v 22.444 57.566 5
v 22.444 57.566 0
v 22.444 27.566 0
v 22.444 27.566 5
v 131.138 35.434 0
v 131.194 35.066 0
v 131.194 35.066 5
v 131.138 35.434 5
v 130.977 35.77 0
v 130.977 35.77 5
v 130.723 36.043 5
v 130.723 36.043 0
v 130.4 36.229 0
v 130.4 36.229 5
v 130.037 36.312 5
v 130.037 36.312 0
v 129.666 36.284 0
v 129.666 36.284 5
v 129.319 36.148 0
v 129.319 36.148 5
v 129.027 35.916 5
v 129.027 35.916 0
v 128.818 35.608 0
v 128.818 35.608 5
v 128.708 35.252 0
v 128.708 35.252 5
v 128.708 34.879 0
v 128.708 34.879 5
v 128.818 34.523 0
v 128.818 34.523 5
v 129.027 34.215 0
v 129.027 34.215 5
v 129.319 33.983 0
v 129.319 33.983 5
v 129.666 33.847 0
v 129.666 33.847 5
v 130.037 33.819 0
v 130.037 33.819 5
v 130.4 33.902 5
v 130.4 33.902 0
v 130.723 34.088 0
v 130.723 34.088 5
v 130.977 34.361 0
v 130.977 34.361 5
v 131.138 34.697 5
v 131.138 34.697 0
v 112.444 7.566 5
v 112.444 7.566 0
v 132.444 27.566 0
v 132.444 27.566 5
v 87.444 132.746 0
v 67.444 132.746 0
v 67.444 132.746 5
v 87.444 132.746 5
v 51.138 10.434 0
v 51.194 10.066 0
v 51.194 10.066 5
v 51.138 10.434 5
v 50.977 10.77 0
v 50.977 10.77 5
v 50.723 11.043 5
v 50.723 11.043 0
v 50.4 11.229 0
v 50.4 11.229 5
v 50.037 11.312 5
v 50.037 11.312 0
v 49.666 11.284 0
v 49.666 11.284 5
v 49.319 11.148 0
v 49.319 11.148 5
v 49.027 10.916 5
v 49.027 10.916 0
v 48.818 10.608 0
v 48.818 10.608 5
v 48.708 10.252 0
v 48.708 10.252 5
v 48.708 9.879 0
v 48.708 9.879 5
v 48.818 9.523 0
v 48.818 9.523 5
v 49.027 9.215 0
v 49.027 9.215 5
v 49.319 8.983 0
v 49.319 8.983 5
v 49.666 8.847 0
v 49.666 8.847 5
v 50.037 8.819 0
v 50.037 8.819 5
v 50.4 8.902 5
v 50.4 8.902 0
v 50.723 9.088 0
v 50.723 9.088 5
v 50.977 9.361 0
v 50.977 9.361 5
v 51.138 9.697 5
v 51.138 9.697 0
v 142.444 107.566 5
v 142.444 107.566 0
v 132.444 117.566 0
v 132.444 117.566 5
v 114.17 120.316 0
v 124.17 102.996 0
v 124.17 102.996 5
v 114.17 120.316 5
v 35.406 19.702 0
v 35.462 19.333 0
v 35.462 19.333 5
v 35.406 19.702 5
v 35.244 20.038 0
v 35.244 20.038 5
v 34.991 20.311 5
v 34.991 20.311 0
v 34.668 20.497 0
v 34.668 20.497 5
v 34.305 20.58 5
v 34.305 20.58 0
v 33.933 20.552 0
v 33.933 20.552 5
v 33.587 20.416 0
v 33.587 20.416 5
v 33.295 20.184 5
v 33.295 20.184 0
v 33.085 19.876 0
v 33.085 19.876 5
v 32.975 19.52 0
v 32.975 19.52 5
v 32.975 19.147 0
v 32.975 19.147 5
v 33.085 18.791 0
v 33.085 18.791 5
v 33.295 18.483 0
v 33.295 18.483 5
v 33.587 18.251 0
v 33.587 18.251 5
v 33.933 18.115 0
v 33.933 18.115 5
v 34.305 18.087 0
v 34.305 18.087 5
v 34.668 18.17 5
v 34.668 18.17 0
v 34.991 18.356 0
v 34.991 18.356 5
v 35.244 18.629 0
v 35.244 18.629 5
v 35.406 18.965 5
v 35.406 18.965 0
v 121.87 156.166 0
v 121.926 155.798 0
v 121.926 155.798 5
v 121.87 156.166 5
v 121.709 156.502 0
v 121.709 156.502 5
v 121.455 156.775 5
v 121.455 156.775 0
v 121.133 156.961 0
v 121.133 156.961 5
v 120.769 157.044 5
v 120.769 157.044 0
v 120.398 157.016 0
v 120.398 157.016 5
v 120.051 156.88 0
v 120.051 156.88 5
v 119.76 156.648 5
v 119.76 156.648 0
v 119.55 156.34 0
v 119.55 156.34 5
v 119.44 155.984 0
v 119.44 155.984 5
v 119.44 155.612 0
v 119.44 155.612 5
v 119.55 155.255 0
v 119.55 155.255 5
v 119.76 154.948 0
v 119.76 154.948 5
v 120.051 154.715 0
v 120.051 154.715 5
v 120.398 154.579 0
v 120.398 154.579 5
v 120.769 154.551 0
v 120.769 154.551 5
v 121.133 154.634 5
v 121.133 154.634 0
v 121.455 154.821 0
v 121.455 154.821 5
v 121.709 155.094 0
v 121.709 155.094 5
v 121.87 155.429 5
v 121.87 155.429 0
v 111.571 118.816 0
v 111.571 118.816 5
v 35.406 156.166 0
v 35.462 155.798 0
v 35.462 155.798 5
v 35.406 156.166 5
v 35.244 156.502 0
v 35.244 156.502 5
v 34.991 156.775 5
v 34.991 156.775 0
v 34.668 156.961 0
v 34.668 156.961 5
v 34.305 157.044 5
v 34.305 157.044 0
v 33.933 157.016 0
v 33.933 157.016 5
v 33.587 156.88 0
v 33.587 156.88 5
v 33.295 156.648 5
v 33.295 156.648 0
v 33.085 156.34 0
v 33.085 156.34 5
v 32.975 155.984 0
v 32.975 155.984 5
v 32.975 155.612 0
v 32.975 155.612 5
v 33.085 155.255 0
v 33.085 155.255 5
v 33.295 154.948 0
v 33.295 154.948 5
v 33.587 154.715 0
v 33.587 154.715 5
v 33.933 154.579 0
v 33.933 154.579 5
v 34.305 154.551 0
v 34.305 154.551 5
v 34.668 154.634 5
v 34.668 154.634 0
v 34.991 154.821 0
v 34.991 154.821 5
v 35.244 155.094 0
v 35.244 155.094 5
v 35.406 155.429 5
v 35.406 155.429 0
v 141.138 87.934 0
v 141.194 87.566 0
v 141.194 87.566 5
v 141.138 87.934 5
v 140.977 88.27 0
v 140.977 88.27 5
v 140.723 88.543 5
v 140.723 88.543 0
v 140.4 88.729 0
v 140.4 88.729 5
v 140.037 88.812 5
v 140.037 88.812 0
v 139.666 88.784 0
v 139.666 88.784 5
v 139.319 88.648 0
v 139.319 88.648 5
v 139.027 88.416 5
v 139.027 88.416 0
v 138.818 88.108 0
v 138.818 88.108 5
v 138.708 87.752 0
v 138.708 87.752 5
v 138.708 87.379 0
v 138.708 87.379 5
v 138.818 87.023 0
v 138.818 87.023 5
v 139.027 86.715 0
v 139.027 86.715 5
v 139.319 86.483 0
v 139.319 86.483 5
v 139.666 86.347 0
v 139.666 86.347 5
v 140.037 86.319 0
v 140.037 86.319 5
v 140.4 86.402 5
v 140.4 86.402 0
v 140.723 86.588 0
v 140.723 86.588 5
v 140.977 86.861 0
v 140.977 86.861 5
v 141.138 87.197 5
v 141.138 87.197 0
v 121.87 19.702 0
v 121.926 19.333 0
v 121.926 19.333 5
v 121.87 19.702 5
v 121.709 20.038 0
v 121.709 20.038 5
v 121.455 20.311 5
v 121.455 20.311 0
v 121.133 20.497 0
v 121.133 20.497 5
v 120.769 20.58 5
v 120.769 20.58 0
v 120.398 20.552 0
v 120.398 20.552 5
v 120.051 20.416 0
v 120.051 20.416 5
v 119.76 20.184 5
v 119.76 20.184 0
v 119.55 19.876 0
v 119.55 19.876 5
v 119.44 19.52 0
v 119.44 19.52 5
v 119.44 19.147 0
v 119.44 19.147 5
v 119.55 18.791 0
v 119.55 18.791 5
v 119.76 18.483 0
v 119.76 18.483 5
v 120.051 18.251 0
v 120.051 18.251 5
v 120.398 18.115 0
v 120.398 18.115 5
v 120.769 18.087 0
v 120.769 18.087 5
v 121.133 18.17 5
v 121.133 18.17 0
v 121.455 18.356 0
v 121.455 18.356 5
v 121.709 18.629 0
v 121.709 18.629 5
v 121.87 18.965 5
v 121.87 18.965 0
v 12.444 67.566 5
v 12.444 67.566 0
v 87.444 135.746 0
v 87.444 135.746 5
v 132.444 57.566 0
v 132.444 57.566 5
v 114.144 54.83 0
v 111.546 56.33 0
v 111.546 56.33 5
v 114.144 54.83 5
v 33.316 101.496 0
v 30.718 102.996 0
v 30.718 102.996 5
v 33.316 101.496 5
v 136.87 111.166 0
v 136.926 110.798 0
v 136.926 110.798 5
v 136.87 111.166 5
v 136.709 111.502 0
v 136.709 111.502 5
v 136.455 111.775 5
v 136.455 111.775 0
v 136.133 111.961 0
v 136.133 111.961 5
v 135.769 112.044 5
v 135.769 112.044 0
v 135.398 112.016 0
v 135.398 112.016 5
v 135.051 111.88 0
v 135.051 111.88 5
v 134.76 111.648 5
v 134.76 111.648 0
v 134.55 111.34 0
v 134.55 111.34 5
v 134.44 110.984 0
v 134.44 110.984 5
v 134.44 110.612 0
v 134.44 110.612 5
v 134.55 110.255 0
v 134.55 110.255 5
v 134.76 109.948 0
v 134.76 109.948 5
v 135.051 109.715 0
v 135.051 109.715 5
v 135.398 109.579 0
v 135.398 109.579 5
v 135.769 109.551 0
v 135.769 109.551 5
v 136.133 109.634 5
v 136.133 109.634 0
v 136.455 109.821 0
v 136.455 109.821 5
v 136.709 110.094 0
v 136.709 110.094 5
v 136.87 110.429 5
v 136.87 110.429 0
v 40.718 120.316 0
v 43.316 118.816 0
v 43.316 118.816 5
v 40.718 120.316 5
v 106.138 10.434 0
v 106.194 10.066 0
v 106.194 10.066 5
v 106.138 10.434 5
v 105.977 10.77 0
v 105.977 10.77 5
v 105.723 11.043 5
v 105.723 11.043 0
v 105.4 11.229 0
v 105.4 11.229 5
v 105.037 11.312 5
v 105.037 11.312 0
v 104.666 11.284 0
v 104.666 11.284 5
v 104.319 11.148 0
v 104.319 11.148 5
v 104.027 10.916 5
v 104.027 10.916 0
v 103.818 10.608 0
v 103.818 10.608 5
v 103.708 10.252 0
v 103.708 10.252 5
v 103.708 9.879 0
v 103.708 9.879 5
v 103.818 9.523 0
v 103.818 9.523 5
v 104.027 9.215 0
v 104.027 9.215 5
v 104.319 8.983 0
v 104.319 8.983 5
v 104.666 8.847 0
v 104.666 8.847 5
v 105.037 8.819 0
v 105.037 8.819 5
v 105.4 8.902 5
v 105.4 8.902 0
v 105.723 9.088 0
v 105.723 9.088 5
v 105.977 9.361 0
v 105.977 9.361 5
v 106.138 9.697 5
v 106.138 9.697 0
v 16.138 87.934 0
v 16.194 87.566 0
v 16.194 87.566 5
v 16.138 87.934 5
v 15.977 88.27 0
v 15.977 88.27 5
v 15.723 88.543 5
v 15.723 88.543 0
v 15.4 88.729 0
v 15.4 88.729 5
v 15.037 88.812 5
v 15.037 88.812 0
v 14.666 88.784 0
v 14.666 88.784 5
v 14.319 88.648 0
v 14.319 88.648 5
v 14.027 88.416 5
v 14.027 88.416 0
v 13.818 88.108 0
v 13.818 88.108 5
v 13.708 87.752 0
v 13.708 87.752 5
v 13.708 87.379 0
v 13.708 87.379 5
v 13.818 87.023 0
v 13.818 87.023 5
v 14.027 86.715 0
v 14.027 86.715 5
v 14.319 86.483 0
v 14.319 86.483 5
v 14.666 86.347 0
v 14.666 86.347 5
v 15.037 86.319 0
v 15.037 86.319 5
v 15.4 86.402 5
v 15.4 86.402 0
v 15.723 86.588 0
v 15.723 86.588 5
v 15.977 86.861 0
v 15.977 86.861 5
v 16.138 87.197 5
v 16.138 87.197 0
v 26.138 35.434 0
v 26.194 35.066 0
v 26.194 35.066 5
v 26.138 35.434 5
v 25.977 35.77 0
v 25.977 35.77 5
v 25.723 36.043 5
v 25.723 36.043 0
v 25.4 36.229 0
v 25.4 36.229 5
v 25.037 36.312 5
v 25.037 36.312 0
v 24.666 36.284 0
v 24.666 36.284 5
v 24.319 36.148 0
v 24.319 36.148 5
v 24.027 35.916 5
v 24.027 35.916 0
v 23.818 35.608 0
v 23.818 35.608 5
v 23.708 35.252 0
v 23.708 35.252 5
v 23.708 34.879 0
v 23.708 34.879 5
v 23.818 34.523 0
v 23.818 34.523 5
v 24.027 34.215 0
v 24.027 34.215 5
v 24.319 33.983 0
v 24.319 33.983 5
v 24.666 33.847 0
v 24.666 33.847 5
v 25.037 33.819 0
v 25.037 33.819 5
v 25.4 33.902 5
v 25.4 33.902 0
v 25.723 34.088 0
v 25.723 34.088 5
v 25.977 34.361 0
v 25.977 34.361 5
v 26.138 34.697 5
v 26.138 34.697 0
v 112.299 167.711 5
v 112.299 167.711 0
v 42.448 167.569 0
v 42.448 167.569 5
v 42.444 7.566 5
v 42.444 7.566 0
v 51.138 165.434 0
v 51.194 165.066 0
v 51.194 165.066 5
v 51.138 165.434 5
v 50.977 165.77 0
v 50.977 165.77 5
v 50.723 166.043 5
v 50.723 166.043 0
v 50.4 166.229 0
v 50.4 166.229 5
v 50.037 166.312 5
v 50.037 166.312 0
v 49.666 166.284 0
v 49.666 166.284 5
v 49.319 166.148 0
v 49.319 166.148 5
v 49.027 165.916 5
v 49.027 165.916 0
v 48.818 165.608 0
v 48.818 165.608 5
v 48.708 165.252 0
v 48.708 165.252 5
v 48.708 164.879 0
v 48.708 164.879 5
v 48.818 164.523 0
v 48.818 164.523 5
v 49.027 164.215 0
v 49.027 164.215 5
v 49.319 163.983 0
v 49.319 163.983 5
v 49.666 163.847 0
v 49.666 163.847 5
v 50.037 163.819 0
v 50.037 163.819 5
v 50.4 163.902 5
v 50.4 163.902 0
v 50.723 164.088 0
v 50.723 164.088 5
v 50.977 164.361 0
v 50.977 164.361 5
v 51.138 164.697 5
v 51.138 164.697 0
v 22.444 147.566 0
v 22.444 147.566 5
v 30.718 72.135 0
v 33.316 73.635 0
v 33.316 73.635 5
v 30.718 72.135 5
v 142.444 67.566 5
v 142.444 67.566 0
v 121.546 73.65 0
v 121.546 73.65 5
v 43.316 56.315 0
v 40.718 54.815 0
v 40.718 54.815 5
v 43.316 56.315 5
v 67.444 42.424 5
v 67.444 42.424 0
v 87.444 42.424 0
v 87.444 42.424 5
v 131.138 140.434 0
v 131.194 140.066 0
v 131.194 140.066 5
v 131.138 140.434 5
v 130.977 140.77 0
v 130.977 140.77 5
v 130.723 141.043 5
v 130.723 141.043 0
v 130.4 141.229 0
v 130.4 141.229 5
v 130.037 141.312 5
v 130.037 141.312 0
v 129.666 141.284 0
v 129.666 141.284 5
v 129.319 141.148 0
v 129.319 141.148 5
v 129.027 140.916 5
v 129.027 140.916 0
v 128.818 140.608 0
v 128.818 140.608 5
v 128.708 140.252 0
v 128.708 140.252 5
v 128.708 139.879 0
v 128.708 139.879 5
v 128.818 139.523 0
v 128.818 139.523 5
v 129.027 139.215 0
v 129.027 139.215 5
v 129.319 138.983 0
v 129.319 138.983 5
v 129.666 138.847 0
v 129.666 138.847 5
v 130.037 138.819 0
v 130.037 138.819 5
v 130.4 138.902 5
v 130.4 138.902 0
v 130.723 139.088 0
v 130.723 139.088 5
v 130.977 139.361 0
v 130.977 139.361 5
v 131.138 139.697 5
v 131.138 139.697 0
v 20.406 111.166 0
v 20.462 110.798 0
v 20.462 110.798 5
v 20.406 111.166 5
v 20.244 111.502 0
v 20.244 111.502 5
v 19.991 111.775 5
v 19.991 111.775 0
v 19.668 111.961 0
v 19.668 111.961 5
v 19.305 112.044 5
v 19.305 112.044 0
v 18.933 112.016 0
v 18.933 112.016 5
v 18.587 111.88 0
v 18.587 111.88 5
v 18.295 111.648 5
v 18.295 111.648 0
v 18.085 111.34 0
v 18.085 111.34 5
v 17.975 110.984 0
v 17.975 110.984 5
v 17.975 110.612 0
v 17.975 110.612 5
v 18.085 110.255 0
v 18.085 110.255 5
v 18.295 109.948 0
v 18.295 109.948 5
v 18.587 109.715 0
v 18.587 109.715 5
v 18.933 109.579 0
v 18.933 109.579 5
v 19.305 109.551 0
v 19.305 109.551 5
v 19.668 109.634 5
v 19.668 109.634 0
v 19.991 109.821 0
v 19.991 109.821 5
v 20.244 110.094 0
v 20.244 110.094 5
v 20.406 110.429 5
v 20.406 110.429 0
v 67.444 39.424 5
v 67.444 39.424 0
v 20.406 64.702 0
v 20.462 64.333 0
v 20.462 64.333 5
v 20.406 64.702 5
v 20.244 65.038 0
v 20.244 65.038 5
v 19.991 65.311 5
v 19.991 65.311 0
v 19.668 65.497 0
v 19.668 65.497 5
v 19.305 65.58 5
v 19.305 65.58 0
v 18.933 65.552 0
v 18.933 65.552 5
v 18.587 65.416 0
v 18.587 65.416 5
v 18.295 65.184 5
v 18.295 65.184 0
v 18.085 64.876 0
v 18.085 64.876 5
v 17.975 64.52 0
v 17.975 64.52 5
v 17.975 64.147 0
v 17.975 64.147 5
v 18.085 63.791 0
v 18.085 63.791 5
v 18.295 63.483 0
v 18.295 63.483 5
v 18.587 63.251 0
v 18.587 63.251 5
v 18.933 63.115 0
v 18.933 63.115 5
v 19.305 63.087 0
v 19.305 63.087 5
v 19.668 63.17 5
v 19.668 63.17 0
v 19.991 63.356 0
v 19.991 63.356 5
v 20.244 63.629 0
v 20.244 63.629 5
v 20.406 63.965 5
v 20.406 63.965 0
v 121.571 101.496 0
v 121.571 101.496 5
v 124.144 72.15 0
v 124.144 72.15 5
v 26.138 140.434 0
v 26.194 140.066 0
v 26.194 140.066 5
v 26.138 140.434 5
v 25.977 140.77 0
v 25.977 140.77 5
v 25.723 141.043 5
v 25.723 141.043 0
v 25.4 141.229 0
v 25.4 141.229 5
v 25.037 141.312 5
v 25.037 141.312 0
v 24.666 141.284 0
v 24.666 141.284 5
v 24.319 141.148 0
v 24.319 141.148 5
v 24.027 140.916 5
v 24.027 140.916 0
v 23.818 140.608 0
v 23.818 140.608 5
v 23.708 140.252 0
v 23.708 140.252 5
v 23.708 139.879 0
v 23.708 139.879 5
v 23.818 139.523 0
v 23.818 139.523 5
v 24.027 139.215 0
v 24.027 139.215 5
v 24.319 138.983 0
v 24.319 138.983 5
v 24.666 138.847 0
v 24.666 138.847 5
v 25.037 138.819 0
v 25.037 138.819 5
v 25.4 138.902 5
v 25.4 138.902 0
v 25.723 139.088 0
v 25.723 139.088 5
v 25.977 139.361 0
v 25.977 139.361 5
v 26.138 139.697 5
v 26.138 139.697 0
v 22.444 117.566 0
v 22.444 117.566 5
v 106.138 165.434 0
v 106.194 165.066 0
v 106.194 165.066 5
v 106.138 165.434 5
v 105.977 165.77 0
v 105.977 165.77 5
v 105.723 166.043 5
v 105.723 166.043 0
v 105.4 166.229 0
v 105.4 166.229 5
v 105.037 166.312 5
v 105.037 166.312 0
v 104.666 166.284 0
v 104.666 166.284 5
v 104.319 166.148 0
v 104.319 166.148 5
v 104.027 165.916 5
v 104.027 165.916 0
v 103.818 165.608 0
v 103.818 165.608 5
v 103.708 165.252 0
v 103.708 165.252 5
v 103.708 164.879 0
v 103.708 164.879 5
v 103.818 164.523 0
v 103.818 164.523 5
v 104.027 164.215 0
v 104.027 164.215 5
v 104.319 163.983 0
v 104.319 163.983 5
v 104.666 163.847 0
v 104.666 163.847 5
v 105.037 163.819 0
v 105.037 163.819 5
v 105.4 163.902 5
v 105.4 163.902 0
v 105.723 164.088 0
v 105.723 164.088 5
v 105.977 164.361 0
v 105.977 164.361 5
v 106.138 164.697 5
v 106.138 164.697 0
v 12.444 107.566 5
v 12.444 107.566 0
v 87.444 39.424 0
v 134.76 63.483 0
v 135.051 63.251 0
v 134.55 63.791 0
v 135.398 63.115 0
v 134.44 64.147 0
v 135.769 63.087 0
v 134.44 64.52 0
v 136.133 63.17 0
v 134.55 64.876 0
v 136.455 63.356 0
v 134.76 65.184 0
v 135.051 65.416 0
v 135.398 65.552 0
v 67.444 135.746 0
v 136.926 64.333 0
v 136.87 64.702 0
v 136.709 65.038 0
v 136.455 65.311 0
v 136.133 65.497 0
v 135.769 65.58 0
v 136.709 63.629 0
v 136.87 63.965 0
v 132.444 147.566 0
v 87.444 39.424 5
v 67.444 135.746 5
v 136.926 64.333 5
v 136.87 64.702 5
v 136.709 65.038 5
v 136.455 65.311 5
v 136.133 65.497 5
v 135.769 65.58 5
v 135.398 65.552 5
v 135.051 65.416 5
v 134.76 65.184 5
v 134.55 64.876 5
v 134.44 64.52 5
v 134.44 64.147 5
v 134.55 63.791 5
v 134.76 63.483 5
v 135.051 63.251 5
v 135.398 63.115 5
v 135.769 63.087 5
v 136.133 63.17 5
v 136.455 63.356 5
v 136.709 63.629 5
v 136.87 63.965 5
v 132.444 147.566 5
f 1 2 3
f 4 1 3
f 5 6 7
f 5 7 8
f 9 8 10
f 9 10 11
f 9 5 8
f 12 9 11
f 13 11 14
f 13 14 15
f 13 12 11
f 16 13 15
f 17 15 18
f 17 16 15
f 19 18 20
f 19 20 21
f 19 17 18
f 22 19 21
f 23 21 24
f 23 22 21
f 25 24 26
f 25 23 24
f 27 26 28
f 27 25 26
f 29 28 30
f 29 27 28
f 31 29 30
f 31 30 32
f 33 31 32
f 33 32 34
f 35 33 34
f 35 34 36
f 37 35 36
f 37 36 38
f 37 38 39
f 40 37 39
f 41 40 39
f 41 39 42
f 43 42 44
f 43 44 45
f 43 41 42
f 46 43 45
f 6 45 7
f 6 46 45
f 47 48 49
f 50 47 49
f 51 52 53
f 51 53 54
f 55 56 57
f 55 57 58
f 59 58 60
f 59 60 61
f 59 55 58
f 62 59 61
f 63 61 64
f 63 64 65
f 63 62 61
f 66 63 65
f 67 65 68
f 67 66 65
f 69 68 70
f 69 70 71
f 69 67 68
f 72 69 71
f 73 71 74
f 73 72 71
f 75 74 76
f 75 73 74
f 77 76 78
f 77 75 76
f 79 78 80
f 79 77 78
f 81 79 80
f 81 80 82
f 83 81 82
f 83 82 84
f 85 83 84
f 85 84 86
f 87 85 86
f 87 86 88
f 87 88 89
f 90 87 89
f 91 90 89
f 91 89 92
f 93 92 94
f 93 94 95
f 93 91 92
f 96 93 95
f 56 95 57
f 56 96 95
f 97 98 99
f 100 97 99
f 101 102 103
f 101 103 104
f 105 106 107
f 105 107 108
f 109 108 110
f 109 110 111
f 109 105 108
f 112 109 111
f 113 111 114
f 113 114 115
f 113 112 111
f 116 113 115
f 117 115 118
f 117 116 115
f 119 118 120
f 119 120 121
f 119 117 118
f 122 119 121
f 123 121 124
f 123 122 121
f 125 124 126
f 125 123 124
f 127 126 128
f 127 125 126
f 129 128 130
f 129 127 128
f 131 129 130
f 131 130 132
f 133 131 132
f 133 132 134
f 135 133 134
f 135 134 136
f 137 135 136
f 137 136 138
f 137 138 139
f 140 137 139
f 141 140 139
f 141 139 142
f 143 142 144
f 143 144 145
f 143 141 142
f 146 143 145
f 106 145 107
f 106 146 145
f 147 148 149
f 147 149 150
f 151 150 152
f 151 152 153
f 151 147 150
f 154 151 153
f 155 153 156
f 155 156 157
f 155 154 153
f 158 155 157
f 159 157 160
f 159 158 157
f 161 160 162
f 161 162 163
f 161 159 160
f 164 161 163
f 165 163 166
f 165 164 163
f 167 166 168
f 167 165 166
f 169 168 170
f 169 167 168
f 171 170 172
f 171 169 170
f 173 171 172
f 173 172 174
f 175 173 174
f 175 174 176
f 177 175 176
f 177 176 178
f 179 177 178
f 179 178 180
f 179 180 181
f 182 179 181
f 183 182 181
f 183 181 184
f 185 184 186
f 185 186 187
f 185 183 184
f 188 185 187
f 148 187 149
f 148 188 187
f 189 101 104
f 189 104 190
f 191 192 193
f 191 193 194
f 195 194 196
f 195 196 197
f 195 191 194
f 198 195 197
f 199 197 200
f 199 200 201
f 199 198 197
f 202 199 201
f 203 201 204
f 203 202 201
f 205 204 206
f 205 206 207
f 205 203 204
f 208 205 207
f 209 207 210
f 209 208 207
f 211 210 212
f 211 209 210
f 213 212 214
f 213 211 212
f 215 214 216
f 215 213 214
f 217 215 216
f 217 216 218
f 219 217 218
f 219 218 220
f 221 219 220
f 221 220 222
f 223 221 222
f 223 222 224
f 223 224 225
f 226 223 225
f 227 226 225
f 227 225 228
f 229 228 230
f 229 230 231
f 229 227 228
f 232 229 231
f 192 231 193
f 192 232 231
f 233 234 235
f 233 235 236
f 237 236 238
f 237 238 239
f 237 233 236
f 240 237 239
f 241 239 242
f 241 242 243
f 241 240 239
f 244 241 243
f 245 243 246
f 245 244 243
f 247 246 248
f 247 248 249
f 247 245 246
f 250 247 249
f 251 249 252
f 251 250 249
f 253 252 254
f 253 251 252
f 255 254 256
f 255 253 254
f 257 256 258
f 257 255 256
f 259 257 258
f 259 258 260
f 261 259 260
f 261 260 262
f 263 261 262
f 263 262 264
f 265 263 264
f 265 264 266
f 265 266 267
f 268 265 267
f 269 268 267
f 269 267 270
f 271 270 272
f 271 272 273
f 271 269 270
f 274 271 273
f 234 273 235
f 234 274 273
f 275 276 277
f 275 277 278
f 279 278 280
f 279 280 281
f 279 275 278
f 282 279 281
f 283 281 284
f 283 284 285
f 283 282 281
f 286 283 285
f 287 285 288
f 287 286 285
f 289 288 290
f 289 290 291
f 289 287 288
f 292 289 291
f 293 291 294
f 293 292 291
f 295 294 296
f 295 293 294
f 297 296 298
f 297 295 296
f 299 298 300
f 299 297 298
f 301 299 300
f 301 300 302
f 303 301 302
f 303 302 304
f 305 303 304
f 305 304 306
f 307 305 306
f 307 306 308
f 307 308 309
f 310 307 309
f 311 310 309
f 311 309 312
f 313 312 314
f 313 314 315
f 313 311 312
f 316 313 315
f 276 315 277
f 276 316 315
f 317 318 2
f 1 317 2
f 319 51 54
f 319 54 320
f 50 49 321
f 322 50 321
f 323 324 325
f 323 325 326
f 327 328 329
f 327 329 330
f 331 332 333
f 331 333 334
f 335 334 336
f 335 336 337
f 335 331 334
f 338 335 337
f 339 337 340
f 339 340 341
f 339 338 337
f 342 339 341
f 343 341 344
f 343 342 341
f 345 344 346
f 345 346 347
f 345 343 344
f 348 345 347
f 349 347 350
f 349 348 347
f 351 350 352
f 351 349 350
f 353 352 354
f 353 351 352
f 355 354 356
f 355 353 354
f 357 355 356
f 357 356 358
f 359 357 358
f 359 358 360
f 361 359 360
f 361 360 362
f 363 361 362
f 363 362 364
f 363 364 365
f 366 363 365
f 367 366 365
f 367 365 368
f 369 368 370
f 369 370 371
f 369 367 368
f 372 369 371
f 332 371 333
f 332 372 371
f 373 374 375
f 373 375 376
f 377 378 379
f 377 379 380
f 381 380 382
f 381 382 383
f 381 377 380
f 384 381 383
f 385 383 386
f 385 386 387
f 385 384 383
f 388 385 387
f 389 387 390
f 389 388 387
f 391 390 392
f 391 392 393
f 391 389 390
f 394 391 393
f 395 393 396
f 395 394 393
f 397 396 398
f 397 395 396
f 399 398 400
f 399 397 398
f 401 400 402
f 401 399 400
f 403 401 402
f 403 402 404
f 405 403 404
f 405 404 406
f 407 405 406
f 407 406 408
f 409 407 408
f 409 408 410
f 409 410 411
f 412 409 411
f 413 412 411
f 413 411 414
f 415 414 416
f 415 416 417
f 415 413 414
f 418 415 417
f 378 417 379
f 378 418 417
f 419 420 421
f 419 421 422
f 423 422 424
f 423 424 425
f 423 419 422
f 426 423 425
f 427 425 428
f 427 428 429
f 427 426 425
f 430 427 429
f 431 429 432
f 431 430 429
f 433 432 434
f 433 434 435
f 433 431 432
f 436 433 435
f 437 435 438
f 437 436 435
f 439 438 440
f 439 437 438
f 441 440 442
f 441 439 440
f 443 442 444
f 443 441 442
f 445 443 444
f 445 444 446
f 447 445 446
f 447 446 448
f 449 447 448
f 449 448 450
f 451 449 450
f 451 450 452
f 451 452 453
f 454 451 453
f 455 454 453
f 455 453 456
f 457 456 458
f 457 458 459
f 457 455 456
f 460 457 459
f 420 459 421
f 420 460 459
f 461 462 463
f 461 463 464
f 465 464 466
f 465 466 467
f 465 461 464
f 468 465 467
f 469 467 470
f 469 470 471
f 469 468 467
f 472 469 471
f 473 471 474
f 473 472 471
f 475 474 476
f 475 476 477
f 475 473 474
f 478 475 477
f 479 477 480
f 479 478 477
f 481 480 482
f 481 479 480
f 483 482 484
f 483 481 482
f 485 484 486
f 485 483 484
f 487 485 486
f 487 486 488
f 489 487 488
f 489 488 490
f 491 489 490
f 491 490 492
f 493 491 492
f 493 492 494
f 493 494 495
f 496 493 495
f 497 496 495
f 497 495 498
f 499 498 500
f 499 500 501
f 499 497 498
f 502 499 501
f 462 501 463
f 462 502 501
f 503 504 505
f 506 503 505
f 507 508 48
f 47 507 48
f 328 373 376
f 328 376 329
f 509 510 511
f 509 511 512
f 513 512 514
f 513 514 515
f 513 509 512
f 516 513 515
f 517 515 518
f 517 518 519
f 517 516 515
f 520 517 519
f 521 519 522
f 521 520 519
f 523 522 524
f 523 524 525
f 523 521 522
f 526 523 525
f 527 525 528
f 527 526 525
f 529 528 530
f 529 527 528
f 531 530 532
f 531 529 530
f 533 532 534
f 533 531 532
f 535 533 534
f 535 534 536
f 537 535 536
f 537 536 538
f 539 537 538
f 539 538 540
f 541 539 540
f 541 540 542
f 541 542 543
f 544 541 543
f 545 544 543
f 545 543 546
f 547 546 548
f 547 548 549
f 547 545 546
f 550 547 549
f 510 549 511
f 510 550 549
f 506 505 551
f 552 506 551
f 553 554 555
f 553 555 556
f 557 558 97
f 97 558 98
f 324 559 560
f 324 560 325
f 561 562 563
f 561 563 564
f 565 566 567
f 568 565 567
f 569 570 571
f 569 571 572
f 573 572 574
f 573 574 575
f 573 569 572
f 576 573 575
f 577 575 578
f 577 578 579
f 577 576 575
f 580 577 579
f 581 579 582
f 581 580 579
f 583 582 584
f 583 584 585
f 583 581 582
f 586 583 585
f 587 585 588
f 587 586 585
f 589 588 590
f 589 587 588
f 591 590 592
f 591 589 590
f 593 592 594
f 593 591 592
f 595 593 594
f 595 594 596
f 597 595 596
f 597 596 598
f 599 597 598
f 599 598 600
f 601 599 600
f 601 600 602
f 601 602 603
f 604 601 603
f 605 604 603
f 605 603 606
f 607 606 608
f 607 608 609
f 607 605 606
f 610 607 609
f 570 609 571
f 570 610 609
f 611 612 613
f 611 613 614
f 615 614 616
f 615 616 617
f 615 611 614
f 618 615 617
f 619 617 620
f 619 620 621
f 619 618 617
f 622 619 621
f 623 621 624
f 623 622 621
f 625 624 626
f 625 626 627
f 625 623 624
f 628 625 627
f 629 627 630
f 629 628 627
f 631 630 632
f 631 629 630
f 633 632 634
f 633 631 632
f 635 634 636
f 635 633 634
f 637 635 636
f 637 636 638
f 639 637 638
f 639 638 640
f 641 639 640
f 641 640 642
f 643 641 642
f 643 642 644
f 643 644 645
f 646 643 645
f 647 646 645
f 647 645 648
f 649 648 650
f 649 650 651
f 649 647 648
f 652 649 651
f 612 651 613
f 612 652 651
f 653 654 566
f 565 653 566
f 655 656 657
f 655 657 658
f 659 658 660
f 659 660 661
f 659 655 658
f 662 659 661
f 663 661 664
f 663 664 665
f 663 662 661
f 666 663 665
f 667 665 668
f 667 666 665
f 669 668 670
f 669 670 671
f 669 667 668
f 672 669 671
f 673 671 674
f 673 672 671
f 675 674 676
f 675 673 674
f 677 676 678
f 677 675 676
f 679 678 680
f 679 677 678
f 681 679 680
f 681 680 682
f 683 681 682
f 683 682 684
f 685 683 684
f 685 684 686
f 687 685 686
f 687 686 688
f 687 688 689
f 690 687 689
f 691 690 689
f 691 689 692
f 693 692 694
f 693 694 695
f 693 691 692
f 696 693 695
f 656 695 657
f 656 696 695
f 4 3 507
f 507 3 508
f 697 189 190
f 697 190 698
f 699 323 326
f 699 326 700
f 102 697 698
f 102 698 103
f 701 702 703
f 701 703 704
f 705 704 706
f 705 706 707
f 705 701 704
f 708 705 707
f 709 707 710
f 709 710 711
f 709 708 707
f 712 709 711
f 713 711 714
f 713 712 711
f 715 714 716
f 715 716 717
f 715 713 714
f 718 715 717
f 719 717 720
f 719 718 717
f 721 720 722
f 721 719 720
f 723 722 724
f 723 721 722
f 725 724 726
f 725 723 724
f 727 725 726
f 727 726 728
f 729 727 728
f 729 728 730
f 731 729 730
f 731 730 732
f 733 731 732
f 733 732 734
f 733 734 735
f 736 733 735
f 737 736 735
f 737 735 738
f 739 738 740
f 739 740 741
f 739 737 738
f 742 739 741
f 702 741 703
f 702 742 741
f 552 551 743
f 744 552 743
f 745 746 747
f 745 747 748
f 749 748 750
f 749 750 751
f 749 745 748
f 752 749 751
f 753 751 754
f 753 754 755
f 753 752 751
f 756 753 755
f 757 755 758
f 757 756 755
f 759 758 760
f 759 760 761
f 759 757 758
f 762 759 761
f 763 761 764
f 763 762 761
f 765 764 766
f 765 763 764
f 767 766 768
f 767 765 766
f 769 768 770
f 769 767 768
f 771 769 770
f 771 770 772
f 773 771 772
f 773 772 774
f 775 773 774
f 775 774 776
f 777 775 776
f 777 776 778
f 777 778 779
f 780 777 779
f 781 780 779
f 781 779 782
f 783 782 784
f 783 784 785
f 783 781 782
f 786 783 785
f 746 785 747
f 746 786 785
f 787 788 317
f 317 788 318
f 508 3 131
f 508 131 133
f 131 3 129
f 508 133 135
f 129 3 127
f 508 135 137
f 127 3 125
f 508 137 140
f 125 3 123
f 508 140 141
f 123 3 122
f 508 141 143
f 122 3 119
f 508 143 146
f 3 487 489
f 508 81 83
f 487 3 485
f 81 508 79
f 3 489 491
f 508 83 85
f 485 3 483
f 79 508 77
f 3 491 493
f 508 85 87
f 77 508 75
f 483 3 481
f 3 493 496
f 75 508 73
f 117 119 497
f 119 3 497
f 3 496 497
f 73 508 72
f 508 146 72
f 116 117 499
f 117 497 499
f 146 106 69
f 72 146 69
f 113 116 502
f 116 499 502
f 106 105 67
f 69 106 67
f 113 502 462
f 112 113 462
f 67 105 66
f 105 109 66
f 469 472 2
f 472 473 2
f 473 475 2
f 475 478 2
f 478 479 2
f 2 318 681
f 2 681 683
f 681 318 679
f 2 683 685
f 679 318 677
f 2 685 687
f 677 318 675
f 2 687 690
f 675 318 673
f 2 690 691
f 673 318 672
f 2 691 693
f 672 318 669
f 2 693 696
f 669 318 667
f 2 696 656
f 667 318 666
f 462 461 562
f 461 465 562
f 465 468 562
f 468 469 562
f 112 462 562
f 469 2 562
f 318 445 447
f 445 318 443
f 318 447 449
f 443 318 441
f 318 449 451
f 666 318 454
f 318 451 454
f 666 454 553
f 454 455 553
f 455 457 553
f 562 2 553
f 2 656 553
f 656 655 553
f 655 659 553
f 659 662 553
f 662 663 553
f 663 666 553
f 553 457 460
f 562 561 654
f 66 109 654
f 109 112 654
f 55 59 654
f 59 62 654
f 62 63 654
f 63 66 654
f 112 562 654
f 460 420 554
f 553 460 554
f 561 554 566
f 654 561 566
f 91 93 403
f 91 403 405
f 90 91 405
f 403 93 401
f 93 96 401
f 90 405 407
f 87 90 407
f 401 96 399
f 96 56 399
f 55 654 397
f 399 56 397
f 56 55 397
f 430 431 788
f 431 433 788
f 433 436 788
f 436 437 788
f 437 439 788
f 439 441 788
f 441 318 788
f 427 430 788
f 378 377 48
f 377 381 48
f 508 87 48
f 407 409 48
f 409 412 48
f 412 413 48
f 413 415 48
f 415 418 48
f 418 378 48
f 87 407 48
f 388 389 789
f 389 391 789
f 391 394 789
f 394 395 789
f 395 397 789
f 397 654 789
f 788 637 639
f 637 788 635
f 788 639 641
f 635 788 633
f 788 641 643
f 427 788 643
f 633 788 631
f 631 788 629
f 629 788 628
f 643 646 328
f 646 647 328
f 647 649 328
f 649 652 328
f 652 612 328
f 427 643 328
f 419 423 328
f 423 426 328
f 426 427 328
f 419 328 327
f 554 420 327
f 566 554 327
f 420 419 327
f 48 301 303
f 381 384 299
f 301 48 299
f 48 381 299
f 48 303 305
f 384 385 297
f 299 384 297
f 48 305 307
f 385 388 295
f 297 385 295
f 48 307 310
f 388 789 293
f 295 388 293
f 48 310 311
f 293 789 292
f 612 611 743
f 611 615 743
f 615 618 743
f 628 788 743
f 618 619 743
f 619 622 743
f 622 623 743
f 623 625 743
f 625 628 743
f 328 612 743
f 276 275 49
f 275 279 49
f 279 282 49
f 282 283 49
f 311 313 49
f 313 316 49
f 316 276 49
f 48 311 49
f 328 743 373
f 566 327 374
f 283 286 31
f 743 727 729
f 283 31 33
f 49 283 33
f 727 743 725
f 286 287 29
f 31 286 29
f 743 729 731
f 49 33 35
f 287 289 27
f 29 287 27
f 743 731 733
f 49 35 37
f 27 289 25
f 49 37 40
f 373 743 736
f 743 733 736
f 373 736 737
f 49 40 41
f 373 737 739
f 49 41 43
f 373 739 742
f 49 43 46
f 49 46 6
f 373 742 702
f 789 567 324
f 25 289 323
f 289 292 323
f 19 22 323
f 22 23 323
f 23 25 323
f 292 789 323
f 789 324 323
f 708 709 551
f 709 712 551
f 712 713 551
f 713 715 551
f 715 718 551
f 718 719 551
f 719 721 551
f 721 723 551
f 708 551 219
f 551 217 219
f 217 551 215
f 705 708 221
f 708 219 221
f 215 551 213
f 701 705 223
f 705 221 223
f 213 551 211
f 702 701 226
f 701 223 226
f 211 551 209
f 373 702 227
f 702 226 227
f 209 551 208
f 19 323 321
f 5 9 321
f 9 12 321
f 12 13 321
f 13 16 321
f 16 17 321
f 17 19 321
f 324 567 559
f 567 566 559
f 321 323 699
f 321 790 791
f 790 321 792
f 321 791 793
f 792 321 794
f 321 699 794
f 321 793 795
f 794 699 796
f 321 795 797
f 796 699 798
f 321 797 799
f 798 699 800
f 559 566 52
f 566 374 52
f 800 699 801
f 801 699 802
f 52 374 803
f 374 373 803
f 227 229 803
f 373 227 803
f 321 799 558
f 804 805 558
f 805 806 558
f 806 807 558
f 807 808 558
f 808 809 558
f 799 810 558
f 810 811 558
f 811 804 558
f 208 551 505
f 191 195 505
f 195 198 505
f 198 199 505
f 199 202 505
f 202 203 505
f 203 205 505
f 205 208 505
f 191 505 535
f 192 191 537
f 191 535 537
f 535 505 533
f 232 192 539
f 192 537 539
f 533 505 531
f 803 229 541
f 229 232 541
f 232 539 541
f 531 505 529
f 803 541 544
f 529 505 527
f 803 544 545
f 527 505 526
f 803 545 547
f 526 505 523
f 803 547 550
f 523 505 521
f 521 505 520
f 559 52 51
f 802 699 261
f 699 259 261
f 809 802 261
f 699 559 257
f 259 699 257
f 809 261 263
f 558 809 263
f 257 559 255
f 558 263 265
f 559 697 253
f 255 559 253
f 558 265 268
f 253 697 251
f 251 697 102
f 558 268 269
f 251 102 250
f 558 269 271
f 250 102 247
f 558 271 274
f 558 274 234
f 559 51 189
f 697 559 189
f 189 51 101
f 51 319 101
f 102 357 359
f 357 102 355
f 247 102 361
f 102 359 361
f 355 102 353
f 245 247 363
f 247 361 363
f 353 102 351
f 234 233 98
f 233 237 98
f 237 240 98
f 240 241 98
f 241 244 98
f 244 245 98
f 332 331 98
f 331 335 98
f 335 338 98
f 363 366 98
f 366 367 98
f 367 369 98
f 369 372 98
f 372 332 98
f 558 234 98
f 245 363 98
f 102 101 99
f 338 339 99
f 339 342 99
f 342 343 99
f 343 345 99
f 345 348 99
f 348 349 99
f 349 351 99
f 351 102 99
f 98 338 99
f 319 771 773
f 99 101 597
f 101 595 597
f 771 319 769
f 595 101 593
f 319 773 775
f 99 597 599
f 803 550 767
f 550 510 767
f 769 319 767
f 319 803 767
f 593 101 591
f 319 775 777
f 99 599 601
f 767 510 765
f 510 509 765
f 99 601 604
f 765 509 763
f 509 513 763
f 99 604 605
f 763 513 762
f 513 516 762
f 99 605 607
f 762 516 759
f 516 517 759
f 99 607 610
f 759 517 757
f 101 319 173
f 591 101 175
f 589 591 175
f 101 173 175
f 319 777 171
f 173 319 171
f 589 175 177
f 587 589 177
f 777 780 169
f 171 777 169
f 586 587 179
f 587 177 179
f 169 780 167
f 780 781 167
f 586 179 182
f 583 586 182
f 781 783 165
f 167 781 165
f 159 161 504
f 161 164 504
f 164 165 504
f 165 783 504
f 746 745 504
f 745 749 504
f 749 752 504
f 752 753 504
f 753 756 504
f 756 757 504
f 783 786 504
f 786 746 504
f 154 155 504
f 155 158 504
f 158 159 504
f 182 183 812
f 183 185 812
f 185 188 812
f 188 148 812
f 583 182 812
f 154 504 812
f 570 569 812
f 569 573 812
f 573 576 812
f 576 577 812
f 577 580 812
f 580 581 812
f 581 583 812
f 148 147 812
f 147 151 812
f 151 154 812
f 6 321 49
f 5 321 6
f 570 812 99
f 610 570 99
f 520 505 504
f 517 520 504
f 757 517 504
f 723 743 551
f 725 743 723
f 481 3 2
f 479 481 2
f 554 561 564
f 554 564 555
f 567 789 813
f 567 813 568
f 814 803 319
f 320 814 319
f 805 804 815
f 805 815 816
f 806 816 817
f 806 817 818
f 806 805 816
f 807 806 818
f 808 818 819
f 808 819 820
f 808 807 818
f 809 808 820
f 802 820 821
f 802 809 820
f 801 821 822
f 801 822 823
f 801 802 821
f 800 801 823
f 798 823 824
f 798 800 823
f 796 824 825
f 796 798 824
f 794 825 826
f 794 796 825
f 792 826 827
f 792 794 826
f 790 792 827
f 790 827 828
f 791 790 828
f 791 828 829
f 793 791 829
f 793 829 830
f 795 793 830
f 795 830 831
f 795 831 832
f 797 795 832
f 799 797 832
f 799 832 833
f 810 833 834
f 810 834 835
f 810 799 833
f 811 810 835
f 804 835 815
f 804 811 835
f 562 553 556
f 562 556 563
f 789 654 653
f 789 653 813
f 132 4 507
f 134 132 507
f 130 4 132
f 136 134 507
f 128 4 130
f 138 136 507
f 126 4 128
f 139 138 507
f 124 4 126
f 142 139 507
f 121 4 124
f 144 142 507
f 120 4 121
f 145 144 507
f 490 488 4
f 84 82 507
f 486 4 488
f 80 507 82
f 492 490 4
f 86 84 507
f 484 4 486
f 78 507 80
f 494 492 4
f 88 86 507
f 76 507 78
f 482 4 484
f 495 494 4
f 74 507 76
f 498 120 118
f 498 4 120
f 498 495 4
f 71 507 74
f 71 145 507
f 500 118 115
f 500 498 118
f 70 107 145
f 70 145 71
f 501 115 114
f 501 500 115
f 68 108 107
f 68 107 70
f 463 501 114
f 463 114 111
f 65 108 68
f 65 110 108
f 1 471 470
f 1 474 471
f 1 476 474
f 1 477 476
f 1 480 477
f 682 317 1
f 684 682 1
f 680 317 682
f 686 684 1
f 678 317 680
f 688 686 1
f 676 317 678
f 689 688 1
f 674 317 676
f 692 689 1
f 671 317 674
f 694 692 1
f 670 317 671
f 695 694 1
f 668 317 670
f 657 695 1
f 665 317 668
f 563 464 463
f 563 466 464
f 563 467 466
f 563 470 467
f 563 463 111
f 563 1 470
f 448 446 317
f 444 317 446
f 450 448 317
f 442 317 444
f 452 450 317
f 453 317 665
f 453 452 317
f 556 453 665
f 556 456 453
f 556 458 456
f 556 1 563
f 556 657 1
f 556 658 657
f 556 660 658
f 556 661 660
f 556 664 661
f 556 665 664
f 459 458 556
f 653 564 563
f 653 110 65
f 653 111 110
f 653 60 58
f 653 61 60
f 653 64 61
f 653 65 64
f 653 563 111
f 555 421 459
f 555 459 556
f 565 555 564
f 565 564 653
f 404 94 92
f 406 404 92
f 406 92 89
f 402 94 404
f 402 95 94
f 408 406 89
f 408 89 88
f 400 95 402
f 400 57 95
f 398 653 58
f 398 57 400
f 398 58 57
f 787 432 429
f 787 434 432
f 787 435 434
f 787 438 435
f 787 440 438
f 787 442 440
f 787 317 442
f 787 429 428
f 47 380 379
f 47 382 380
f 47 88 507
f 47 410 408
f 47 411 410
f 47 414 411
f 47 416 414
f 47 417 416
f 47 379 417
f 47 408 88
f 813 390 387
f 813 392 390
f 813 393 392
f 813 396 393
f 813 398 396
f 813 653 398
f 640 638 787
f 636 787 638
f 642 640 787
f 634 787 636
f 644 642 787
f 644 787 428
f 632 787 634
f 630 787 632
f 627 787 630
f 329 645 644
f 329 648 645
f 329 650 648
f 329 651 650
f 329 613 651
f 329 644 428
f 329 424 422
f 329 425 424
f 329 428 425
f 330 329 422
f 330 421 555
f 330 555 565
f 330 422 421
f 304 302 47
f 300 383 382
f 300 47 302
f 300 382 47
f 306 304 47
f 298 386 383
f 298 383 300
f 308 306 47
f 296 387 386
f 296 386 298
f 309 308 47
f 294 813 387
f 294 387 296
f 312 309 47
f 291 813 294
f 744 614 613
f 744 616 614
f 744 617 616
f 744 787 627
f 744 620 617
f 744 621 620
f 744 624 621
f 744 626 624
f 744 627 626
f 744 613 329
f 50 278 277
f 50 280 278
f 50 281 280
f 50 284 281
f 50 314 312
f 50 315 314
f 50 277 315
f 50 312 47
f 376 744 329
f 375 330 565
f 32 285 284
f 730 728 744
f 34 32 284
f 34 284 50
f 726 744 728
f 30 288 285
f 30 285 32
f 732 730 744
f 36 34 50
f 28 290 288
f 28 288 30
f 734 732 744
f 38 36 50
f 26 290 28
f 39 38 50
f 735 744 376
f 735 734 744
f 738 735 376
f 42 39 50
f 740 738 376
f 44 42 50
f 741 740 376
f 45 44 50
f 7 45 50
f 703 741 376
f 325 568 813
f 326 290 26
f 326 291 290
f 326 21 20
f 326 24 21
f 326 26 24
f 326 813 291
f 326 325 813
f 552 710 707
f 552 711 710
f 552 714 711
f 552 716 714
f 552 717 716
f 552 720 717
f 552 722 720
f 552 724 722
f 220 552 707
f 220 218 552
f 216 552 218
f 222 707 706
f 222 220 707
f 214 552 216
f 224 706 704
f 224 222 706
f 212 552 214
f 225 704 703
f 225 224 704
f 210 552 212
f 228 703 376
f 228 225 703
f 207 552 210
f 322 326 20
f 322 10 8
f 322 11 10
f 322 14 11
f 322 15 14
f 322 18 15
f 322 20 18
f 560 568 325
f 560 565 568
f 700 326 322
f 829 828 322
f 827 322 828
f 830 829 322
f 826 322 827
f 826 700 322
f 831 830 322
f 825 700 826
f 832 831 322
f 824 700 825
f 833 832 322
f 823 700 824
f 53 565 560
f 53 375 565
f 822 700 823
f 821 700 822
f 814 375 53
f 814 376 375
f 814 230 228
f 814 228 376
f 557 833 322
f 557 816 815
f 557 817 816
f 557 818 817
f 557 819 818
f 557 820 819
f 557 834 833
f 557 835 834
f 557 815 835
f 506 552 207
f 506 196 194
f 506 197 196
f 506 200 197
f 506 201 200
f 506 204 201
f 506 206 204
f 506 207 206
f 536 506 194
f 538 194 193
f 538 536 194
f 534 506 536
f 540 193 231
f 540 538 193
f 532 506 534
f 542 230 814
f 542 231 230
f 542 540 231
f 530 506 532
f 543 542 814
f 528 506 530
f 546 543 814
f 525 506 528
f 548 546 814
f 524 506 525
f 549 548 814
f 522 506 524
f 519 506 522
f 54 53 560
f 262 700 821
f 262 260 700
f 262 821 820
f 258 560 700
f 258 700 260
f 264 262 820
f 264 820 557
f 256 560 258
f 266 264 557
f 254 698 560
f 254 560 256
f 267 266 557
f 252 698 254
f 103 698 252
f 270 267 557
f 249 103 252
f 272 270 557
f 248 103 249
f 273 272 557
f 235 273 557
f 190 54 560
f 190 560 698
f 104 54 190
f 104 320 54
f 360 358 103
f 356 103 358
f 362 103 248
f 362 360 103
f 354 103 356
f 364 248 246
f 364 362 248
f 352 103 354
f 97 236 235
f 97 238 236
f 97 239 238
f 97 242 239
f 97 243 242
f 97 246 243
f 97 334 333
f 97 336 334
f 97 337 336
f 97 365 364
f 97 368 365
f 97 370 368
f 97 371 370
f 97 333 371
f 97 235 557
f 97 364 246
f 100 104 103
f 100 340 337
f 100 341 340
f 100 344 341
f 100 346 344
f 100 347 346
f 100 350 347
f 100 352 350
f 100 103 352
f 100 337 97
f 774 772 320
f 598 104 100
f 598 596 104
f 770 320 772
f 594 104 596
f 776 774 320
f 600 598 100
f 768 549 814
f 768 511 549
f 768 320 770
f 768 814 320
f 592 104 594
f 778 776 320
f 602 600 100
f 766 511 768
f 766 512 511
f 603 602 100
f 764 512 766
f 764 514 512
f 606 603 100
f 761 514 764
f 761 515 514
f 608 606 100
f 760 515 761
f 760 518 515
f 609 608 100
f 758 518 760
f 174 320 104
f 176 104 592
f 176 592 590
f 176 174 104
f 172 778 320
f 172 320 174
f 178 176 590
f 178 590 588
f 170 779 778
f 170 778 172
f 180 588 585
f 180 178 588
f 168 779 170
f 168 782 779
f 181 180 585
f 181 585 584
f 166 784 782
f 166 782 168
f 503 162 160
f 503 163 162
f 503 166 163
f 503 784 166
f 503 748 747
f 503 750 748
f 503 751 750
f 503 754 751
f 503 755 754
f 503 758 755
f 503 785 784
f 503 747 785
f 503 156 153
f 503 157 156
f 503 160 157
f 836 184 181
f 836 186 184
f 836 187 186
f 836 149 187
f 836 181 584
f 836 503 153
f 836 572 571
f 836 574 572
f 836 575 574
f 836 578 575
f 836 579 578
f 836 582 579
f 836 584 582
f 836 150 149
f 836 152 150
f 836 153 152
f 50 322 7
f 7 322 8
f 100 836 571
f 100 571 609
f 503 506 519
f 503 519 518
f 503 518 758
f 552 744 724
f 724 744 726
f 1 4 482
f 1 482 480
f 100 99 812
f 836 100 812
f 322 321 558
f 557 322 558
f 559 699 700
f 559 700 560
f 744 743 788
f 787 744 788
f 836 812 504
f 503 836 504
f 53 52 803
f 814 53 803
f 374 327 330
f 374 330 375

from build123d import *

# Parameters (mm, degrees)
MODEL_R             = 1.25
MODEL_W             = 20
MODEL_H             = 3
BOSS_EXTRUDE1_DEPTH = 5


with BuildPart() as part:
    # Model → Boss-Extrude1 (new body)
    with BuildSketch(Plane.XY):
        Polygon((112.443761684, 7.565594359), (132.443761684, 27.565594359), (132.443761684, 57.565594359), (142.443761684, 67.565594359), (142.443761684, 107.565594359), (132.443761684, 117.565594359), (132.443761684, 147.565594359), (112.298529785, 167.710826258), (42.447520771, 167.569353446), (22.443761684, 147.565594359), (22.443761684, 117.565594359), (12.443761684, 107.565594359), (12.443761684, 67.565594359), (22.443761684, 57.565594359), (22.443761684, 27.565594359), (42.443761684, 7.565594359), align=None)
        with Locations((104.943761684, 10.065594359)):
            Circle(MODEL_R, mode=Mode.SUBTRACT)
        with Locations((129.943761684, 35.065594359)):
            Circle(MODEL_R, mode=Mode.SUBTRACT)
        with Locations((120.675994731, 19.333361312)):
            Circle(MODEL_R, mode=Mode.SUBTRACT)
        with Locations((49.943761684, 10.065594359)):
            Circle(MODEL_R, mode=Mode.SUBTRACT)
        with Locations((24.943761684, 35.065594359)):
            Circle(MODEL_R, mode=Mode.SUBTRACT)
        with Locations((34.211528637, 19.333361312)):
            Circle(MODEL_R, mode=Mode.SUBTRACT)
        with Locations((104.943761684, 165.065594359)):
            Circle(MODEL_R, mode=Mode.SUBTRACT)
        with Locations((129.943761684, 140.065594359)):
            Circle(MODEL_R, mode=Mode.SUBTRACT)
        with Locations((120.675994731, 155.797827406)):
            Circle(MODEL_R, mode=Mode.SUBTRACT)
        with Locations((49.943761684, 165.065594359)):
            Circle(MODEL_R, mode=Mode.SUBTRACT)
        with Locations((24.943761684, 140.065594359)):
            Circle(MODEL_R, mode=Mode.SUBTRACT)
        with Locations((34.211528637, 155.797827406)):
            Circle(MODEL_R, mode=Mode.SUBTRACT)
        with Locations((19.211528637, 64.333361312)):
            Circle(MODEL_R, mode=Mode.SUBTRACT)
        with Locations((14.943761684, 87.565594359)):
            Circle(MODEL_R, mode=Mode.SUBTRACT)
        with Locations((19.211528637, 110.797827406)):
            Circle(MODEL_R, mode=Mode.SUBTRACT)
        with Locations((135.675994731, 64.333361312)):
            Circle(MODEL_R, mode=Mode.SUBTRACT)
        with Locations((139.943761684, 87.565594359)):
            Circle(MODEL_R, mode=Mode.SUBTRACT)
        with Locations((135.675994731, 110.797827406)):
            Circle(MODEL_R, mode=Mode.SUBTRACT)
        with Locations((77.443761684, 134.246405176)):
            Rectangle(MODEL_W, MODEL_H, mode=Mode.SUBTRACT)
        with Locations((77.443761684, 40.923947526)):
            Rectangle(MODEL_W, MODEL_H, mode=Mode.SUBTRACT)
        Polygon((111.546053861, 56.329621407), (114.144130073, 54.829621407), (124.144130073, 72.150129482), (121.546053861, 73.650129482), align=None, mode=Mode.SUBTRACT)
        Polygon((114.169567826, 120.316253805), (111.571491615, 118.816253805), (121.571491615, 101.49574573), (124.169567826, 102.99574573), align=None, mode=Mode.SUBTRACT)
        Polygon((40.717955541, 54.814934913), (43.316031753, 56.314934913), (33.316031753, 73.635442988), (30.717955541, 72.135442988), align=None, mode=Mode.SUBTRACT)
        Polygon((30.717955541, 102.99574573), (33.316031753, 101.49574573), (43.316031753, 118.816253805), (40.717955541, 120.316253805), align=None, mode=Mode.SUBTRACT)
    extrude(amount=BOSS_EXTRUDE1_DEPTH)


solid = part.part
